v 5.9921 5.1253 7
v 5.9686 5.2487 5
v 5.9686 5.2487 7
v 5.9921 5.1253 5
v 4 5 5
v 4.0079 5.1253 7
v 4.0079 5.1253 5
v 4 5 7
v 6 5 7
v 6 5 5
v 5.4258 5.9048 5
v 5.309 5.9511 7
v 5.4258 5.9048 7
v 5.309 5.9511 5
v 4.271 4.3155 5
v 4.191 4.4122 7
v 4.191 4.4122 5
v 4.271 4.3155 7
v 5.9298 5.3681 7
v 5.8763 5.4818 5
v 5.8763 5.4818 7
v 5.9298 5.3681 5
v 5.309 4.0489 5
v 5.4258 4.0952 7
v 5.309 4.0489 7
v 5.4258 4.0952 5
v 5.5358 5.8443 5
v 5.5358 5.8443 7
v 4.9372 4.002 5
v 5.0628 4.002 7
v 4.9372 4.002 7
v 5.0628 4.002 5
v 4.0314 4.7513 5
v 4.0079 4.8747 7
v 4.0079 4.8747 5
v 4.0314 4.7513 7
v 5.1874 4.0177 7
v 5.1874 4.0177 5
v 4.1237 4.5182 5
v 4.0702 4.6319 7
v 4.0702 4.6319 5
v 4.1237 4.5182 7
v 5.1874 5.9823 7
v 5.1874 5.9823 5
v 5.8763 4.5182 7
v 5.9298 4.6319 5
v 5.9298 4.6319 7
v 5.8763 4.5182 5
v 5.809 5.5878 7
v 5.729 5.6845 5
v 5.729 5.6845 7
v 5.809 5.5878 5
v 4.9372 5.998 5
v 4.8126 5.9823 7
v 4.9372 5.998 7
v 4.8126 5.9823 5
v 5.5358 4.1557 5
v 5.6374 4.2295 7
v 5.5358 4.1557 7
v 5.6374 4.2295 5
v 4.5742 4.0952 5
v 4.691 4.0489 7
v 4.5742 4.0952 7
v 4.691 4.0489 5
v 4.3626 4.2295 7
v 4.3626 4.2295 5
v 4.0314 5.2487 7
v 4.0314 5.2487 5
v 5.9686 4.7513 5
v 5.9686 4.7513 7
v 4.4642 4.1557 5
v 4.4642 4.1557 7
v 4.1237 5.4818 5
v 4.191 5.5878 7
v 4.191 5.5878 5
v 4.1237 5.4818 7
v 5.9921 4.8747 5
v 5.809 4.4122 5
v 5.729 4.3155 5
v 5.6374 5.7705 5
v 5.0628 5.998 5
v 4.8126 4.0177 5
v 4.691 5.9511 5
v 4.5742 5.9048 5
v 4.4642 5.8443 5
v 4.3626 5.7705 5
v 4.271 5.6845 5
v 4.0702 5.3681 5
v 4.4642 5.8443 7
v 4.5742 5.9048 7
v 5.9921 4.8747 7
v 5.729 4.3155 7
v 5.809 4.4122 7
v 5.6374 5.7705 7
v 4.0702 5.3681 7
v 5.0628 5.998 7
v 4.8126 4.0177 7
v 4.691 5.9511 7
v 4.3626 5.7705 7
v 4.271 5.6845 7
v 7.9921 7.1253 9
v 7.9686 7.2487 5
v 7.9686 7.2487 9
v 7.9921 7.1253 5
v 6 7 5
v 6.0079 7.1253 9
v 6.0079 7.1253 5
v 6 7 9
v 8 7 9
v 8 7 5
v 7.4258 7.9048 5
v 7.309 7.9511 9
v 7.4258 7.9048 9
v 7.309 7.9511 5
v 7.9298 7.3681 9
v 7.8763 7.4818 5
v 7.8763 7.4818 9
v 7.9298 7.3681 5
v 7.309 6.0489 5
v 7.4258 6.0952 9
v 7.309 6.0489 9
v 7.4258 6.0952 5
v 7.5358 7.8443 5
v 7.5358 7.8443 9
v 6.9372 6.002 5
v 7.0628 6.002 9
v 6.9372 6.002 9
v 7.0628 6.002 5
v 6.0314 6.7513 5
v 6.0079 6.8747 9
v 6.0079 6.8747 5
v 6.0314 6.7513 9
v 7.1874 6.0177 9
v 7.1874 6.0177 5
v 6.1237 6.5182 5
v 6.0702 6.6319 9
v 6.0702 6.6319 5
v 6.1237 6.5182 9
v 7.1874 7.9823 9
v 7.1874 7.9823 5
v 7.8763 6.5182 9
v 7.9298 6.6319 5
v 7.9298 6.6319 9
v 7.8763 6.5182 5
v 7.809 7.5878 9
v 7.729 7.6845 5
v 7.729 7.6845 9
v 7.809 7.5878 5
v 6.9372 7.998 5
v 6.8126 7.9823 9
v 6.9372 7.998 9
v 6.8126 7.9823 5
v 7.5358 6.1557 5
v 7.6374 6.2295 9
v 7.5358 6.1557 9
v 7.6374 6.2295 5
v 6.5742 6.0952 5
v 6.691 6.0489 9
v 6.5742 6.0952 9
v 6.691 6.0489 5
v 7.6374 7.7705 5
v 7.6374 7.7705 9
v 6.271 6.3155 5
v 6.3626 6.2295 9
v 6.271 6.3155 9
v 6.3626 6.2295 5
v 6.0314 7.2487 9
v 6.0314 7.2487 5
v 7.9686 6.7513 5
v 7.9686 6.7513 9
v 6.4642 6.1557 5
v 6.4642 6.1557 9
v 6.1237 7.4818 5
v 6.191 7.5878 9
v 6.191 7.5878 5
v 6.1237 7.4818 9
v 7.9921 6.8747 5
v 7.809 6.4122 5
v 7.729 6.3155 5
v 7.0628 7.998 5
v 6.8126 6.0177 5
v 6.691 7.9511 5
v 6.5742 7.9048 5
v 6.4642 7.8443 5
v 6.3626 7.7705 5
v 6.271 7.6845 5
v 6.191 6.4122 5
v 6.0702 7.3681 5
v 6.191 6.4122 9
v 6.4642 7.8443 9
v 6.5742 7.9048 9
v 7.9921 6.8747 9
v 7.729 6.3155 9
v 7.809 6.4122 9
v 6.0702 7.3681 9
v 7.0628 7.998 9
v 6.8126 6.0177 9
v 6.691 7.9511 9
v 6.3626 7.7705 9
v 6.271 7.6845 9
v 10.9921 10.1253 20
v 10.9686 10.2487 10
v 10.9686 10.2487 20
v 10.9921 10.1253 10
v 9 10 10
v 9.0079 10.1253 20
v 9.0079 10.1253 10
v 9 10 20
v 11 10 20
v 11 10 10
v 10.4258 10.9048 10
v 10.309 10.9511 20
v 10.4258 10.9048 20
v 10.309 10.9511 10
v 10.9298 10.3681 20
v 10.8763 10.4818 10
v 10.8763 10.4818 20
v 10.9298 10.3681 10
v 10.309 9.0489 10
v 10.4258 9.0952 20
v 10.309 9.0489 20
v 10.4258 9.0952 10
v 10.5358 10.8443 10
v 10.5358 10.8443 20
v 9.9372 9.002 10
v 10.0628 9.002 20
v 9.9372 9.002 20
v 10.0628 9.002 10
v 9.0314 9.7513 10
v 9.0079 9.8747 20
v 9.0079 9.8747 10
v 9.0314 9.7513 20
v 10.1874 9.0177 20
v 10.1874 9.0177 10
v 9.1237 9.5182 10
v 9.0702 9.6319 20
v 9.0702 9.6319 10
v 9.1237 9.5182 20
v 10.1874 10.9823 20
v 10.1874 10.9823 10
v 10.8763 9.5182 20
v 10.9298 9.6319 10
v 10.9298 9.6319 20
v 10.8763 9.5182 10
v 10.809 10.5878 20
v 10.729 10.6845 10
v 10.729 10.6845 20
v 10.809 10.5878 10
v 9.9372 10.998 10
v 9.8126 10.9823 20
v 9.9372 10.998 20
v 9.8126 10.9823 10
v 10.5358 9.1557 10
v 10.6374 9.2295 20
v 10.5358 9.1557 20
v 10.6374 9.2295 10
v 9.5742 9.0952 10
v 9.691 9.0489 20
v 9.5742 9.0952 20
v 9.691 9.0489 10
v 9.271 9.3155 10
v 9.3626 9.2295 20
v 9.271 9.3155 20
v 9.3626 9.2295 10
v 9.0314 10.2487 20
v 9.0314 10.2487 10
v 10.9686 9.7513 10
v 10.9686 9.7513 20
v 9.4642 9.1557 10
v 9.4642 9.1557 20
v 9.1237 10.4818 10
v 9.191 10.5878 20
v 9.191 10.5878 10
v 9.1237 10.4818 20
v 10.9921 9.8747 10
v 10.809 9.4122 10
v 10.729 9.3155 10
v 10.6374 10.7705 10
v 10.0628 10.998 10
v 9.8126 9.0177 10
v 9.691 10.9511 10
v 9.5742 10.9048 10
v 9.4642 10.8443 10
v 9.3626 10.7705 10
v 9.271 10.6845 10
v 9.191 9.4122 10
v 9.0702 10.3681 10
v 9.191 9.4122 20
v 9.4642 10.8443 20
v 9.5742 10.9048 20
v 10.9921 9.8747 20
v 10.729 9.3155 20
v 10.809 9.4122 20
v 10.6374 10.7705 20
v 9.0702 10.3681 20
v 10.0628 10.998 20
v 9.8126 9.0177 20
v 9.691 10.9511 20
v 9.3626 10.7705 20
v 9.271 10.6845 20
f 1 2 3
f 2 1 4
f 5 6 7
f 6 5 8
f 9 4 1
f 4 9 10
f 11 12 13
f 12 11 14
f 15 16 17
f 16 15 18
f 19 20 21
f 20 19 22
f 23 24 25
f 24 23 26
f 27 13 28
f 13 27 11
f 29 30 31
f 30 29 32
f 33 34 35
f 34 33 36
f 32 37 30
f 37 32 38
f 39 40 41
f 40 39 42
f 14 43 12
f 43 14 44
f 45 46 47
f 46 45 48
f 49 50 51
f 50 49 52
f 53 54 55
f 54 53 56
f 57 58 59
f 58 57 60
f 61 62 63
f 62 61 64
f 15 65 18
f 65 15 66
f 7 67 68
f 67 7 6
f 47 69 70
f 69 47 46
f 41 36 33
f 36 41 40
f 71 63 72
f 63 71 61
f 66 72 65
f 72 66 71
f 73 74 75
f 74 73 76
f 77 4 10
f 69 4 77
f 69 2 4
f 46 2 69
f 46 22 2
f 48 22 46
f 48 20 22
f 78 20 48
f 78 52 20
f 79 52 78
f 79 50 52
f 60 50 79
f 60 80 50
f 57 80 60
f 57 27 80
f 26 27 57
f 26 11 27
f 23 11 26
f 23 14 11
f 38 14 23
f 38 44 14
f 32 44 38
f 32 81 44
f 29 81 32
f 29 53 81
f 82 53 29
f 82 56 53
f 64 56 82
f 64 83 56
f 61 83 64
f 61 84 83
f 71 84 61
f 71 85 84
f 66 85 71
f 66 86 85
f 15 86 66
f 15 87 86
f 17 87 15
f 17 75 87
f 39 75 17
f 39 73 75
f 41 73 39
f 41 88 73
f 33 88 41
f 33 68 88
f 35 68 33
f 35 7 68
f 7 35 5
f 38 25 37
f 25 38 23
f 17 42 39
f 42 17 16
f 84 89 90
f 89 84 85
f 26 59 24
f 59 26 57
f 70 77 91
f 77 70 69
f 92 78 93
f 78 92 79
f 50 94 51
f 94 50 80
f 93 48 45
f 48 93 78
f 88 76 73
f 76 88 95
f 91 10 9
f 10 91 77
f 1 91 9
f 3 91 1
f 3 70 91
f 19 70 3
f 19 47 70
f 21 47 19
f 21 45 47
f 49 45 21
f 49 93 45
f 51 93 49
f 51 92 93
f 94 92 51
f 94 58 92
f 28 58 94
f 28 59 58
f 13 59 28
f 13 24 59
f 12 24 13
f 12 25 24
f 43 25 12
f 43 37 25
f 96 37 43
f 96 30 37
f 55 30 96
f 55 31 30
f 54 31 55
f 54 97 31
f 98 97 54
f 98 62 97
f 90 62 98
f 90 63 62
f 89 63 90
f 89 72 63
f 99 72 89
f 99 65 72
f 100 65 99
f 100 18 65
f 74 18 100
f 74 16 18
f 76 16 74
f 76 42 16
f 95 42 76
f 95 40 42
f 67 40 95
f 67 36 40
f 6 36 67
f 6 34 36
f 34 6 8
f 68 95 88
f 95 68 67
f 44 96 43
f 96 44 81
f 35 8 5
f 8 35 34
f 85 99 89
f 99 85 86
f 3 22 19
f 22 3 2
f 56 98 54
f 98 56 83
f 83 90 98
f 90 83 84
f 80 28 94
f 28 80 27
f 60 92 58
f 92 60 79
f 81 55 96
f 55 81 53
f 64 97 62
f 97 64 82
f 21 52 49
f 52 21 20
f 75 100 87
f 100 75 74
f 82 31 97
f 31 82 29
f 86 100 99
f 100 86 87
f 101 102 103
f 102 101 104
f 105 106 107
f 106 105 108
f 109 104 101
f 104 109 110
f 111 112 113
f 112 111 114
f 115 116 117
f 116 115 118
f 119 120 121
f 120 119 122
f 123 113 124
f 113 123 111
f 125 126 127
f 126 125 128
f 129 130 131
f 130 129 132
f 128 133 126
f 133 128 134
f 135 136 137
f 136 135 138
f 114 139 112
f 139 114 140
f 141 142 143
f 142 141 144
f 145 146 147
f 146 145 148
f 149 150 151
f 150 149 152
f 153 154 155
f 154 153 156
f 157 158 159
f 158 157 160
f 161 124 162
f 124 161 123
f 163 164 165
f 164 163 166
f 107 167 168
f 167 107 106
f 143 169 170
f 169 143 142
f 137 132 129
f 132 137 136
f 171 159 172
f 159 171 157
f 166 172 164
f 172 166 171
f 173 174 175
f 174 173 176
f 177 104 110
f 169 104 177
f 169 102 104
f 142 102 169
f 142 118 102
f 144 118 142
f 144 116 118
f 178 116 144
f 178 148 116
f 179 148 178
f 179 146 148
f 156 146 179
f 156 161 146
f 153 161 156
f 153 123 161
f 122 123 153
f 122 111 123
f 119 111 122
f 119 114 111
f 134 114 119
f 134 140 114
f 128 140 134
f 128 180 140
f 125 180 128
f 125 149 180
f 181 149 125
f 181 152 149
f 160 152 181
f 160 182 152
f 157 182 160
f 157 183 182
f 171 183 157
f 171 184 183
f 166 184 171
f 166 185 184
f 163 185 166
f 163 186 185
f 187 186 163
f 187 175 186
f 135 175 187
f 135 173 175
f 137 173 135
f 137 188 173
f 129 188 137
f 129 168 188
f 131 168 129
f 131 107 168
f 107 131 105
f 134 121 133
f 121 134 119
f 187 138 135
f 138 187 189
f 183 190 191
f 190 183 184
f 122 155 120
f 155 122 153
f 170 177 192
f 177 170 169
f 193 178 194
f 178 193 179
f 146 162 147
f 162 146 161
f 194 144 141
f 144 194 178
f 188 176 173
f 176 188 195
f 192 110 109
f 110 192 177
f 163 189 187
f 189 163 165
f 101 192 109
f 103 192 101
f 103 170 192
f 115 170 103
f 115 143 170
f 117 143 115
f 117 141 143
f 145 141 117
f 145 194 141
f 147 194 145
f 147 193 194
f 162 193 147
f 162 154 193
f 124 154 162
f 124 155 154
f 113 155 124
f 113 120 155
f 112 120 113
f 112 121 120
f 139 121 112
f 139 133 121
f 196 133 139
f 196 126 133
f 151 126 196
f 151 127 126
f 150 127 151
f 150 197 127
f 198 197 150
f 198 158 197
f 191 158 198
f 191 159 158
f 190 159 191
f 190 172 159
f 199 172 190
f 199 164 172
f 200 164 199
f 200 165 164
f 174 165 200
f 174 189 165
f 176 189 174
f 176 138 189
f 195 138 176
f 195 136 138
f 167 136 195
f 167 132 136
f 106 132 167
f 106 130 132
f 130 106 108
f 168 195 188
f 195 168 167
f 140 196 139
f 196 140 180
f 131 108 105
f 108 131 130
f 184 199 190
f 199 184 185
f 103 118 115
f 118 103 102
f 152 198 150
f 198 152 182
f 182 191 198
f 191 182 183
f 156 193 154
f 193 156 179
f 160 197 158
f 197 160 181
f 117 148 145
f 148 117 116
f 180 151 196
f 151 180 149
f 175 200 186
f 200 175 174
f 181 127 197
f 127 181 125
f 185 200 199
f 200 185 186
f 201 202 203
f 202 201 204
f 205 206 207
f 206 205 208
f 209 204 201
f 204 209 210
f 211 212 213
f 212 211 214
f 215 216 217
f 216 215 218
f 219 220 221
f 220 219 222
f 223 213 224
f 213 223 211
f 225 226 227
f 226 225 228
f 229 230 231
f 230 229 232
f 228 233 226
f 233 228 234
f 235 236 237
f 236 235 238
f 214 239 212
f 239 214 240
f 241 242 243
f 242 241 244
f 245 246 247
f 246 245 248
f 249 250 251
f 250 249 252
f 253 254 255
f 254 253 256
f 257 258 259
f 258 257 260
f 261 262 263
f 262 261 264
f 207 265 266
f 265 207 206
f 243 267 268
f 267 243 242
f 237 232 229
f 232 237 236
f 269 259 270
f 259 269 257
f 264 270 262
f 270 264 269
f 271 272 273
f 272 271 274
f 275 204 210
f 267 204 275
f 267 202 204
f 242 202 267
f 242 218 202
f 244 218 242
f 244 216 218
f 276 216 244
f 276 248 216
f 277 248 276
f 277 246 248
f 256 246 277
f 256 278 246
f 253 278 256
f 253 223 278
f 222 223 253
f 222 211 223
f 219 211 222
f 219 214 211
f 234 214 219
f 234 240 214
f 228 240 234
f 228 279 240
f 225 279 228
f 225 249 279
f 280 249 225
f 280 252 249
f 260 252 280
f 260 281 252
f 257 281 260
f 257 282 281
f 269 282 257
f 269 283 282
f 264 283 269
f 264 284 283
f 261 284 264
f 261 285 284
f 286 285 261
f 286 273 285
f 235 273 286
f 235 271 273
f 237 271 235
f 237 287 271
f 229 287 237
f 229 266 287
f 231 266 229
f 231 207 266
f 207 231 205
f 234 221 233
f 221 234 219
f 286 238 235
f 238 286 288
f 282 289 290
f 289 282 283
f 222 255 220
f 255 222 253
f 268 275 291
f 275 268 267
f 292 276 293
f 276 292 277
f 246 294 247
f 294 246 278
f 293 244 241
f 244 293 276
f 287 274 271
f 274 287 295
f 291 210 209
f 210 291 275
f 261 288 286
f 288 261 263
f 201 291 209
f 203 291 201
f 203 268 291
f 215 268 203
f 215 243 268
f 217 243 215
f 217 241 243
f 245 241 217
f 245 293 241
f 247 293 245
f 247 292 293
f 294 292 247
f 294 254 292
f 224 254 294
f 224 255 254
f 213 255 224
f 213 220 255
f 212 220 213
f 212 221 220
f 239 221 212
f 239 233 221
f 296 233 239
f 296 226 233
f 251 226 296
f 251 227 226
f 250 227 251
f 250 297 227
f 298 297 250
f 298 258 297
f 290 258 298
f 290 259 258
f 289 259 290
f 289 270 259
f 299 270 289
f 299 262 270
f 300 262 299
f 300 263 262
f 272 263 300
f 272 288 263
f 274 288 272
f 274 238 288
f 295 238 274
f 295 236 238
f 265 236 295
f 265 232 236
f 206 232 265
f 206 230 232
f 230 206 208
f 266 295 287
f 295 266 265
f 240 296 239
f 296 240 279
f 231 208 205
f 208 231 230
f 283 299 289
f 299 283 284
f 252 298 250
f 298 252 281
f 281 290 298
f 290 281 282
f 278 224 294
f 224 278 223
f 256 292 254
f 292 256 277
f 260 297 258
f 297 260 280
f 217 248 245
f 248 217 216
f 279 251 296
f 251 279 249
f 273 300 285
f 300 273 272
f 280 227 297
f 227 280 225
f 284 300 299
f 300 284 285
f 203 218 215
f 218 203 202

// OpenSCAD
//pillar primitive test
$fa=50;
$fn=50;

radius = 1;
x=5;
y=5;
z_height = 5;
bridge_height = 2;

x1=7;
y1=7;
z_height1 = 5;
bridge_height1 = 4;

module pillar(x_coord, y_coord, z_coord, z_height)
{
    translate([x_coord, y_coord, z_coord])
    linear_extrude(z_height)
    circle(radius);
}
pillar(x, y, z_height, bridge_height);
pillar(x1, y1, z_height1, bridge_height1);

/*
module pillar1()
{
    translate([x1, y1, z_height1])
    linear_extrude(bridge_height1)
    circle(radius);
}
pillar1();*/

union()
{
    pillar(x, y, z_height, bridge_height);
    pillar(x1, y1, z_height1, bridge_height1);
    pillar(10, 10, 10, 10);
}
